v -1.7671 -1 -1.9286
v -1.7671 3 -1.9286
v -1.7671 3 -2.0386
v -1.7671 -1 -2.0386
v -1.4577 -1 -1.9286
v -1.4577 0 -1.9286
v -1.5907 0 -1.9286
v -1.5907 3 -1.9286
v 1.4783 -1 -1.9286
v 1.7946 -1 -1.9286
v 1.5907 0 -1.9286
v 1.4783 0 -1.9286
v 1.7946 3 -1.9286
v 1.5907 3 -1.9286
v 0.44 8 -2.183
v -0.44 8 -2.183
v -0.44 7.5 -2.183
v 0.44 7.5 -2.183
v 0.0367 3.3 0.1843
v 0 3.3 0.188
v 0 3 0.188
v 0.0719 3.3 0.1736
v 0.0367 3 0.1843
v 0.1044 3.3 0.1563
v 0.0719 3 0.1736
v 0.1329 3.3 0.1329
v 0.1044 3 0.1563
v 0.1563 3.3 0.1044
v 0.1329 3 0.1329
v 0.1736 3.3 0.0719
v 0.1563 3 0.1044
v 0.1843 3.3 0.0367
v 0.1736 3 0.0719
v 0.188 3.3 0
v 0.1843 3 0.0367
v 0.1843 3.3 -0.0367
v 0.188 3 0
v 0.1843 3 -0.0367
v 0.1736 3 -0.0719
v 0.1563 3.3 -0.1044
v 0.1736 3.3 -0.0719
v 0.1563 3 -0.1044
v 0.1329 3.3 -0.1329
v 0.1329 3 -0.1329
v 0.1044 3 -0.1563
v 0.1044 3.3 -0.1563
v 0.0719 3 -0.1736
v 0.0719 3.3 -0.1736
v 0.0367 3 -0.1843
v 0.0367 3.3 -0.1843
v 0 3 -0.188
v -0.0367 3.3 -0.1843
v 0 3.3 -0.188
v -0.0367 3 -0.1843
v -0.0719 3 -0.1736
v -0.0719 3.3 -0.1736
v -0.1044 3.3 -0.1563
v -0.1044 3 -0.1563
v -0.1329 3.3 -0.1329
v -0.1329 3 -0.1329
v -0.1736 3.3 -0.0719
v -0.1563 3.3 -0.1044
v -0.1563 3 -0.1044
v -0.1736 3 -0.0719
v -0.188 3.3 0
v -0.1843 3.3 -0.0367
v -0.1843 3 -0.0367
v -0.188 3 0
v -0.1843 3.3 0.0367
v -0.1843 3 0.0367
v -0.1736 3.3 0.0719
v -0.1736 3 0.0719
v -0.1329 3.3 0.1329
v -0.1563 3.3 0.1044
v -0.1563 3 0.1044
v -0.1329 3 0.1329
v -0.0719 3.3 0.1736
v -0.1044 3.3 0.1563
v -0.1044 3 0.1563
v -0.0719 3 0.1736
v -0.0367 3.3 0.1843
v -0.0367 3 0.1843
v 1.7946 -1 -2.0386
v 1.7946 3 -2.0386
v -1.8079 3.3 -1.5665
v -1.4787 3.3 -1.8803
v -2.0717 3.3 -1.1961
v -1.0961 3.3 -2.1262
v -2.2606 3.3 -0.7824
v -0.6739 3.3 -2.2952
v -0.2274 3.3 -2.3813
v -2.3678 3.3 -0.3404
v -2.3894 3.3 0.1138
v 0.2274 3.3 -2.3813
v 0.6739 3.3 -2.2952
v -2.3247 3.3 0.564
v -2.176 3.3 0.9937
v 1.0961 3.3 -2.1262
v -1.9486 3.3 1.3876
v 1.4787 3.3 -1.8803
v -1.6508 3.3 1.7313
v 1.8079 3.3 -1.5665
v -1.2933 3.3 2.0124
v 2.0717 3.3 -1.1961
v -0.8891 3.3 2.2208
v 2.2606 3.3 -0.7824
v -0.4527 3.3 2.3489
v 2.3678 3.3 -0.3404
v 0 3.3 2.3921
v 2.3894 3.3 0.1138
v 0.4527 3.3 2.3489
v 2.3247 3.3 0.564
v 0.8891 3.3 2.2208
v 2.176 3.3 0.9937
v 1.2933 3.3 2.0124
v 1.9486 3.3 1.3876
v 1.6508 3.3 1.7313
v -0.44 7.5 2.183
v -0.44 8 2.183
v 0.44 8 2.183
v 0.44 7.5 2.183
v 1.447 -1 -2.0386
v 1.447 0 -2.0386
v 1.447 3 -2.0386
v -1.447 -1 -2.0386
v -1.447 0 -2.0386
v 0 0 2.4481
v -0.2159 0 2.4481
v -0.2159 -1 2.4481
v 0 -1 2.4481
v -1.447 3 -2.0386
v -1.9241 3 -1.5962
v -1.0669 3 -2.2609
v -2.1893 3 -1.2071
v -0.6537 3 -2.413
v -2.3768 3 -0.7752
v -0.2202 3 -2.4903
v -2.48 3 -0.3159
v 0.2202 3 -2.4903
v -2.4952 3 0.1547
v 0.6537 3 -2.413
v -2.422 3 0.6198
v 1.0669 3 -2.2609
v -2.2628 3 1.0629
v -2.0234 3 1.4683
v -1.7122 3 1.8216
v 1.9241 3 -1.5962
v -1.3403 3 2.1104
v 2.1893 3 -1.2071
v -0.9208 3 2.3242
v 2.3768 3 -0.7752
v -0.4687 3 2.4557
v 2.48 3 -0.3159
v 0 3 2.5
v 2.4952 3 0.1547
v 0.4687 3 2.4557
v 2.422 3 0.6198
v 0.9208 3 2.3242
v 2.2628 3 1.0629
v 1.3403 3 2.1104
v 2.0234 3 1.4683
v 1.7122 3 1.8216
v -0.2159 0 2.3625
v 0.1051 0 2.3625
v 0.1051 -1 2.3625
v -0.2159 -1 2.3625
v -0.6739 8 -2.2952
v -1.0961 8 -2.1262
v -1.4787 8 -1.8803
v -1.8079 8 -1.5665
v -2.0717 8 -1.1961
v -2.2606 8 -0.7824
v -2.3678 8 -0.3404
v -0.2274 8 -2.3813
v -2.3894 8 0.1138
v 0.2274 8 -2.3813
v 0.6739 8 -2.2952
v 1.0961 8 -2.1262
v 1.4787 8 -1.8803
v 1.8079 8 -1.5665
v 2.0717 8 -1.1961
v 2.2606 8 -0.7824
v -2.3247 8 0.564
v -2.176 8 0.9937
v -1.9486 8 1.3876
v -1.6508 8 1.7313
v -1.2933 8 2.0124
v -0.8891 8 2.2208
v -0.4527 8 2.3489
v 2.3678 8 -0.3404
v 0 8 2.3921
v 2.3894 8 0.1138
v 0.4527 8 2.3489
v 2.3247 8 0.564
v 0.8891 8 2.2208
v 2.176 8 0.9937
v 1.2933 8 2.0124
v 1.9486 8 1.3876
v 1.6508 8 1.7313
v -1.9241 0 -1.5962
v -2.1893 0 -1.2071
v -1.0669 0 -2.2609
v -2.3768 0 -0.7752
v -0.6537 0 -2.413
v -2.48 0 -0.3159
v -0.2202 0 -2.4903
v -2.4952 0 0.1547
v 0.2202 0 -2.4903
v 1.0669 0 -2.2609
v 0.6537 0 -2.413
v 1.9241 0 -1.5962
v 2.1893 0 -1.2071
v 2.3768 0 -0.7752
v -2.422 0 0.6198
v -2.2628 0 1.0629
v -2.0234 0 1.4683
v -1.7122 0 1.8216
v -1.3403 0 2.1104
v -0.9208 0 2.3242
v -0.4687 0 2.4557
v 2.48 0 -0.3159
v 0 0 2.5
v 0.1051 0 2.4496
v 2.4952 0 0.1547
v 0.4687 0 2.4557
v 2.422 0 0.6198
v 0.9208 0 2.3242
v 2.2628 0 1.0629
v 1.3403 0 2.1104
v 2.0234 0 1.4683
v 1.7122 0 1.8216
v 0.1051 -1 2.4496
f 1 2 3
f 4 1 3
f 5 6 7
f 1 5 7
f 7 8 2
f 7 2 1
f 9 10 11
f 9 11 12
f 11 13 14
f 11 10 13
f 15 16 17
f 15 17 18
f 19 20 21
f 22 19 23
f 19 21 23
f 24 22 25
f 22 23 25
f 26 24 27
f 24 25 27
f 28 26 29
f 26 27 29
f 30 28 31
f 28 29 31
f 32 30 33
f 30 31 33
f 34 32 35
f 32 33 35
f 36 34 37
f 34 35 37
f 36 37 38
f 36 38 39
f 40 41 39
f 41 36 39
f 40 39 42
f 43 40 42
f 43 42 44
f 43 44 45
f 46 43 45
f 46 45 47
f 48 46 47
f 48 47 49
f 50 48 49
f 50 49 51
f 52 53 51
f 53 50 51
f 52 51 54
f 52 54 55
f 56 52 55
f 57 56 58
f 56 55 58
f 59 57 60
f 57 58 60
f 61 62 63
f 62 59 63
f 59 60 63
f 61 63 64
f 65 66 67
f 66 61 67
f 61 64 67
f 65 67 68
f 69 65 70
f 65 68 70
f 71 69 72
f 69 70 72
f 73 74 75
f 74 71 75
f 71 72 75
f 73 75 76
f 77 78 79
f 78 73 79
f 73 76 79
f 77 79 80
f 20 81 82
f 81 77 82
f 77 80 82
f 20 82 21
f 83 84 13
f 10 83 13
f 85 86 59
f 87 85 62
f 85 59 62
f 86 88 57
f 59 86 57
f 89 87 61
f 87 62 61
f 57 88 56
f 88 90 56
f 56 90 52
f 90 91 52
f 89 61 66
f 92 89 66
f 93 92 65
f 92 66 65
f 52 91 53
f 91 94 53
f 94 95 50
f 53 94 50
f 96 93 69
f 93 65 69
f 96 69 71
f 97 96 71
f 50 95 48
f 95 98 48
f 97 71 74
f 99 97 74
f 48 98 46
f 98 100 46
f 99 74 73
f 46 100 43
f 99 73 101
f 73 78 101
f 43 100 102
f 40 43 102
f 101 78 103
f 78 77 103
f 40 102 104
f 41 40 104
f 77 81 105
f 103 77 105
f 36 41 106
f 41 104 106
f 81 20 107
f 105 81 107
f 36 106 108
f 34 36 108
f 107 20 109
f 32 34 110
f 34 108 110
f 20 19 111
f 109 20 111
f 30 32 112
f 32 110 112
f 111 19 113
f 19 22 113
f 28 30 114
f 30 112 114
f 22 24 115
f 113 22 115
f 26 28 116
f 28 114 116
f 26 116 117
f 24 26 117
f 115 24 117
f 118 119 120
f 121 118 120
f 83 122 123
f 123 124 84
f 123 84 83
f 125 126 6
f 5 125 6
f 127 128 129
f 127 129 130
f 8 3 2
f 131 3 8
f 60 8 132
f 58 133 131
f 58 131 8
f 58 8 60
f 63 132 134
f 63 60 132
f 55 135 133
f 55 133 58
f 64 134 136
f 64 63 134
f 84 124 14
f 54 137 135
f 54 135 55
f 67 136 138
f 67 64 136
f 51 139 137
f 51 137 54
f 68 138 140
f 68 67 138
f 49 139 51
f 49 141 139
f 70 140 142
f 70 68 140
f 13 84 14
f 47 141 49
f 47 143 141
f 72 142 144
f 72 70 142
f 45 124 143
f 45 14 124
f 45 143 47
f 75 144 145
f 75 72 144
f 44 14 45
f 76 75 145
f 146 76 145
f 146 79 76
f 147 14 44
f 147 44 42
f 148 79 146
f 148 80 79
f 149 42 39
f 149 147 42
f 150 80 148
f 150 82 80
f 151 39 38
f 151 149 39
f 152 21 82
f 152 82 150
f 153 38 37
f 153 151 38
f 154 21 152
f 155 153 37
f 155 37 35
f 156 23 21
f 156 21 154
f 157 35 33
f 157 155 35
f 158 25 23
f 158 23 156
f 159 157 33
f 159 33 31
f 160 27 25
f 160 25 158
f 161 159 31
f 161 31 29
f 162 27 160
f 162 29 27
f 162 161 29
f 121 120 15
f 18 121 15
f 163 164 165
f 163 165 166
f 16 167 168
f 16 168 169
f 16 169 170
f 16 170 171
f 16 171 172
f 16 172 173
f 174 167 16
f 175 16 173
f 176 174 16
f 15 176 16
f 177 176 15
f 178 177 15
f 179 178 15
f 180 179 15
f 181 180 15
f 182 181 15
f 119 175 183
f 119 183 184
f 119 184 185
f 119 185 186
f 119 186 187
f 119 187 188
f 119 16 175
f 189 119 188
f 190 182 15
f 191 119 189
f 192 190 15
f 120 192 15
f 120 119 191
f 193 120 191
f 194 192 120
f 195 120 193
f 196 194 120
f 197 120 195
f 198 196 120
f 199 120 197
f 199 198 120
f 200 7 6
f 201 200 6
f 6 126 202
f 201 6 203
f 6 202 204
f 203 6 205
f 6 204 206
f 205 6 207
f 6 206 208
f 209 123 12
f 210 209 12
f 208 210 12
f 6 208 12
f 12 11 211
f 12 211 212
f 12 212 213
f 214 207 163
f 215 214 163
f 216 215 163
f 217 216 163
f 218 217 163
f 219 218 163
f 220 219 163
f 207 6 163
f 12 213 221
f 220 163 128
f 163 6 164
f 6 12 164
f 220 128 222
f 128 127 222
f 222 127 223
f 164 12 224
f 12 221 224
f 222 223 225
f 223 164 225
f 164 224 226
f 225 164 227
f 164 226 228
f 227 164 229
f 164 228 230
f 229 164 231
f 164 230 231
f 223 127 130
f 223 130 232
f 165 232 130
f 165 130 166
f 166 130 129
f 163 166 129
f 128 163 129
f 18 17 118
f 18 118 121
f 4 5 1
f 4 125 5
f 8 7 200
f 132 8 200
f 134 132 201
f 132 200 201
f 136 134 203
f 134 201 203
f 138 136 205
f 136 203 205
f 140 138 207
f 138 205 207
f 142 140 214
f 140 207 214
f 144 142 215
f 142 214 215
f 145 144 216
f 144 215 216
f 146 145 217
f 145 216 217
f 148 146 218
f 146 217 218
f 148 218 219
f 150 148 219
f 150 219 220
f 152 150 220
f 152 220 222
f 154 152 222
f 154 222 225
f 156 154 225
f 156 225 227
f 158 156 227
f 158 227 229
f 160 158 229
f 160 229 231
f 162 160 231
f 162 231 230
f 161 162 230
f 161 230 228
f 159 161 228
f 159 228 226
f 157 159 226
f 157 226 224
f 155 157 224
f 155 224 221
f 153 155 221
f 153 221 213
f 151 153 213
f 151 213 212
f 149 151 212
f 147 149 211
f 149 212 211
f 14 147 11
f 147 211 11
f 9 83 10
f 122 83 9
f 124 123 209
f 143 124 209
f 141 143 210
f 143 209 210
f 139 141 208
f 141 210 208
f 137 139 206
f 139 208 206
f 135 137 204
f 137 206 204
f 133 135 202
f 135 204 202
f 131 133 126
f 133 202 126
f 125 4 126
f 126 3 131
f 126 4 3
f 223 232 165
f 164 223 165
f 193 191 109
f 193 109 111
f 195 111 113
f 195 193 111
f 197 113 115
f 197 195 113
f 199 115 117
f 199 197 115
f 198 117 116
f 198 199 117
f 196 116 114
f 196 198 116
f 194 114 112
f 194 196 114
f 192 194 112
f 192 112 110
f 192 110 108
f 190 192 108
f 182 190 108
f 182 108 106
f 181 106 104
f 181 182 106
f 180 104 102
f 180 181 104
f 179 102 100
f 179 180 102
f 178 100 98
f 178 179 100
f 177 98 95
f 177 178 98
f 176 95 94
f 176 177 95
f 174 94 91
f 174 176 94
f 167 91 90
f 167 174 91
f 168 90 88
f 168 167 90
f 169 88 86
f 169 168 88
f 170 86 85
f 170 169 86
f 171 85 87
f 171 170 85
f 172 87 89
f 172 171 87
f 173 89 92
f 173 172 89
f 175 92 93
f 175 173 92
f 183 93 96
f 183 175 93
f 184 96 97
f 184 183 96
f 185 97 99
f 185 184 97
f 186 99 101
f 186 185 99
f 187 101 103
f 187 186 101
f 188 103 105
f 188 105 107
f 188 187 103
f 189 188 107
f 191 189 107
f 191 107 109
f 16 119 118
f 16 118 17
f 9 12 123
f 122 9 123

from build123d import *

# Parameters (mm, degrees)
SKETCH_1_R          = 2.5
EXTRUDE_1_DEPTH     = 3
SKETCH_2_R          = 0.187953655
EXTRUDE_2_DEPTH     = 7.3
CUT_EXTRUDE_START   = -2.3
SKETCH_4_R          = 0.187953655
CUT_EXTRUDE_1_DEPTH = 2.3
SKETCH_6_R          = 2.392138428
EXTRUDE_3_DEPTH     = 4.7
SKETCH_7_W          = 0.880091412
SKETCH_7_H          = 4.366078492
CUT_EXTRUDE_3_DEPTH = 0.5
EXTRUDE_4_DEPTH     = 1
EXTRUDE_5_DEPTH     = 4
SKETCH_11_W         = 0.290967458
SKETCH_11_H         = 0.085529097
CUT_EXTRUDE_4_DEPTH = 1


with BuildPart() as part:
    # 草图1 → 凸台-拉伸1 (new body)
    with BuildSketch(Plane(origin=(0, 0, 0), x_dir=(1, 0, 0), z_dir=(0, 1, 0))):
        with Locations(Location((0, 0, 0), (0, 0, 270))):
            Circle(SKETCH_1_R)
    extrude(amount=EXTRUDE_1_DEPTH)

    # 草图2 → 凸台-拉伸2 (add)
    with BuildSketch(Plane(origin=(0, 3, 0), x_dir=(1, 0, 0), z_dir=(0, 1, 0))):
        with Locations(Location((0, 0, 0), (0, 0, 270))):
            Circle(SKETCH_2_R)
    extrude(amount=EXTRUDE_2_DEPTH)

    # 草图4 → 切除-拉伸1 (cut)
    with BuildSketch(Plane(origin=(0, 10.3, 0), x_dir=(1, 0, 0), z_dir=(0, 1, 0)).offset(CUT_EXTRUDE_START)):
        with Locations(Location((0, 0, 0), (0, 0, 270))):
            Circle(SKETCH_4_R)
    extrude(amount=CUT_EXTRUDE_1_DEPTH, mode=Mode.SUBTRACT)

    # 草图6 → 凸台-拉伸3 (add)
    with BuildSketch(Plane(origin=(0, 8, 0), x_dir=(1, 0, 0), z_dir=(0, 1, 0))):
        with Locations(Location((0, 0, 0), (0, 0, 270))):
            Circle(SKETCH_6_R)
    extrude(amount=-EXTRUDE_3_DEPTH)

    # 草图7 → 切除-拉伸3 (cut)
    with BuildSketch(Plane(origin=(0, 8, 0), x_dir=(1, 0, 0), z_dir=(0, 1, 0))):
        Rectangle(SKETCH_7_W, SKETCH_7_H)
    extrude(amount=-CUT_EXTRUDE_3_DEPTH, mode=Mode.SUBTRACT)

    # 草图9 → 凸台-拉伸4 (add)
    with BuildSketch(Plane.XZ):
        Polygon((0, 2.448076853), (0.473512734, 2.454747582), (0.473512734, 2.362547756), (-0.506872491, 2.362547756), (-0.506872491, 2.448076853), align=None)
    extrude(amount=EXTRUDE_4_DEPTH)

    # 草图10 → 凸台-拉伸5 (add)
    with BuildSketch(Plane(origin=(0, 3, 0), x_dir=(1, 0, 0), z_dir=(0, 1, 0))):
        Polygon((-1.457651402, 1.928637822), (-1.767058539, 1.928637822), (-1.767058539, 2.038649249), (-1.447034637, 2.038649249), align=None)
        Polygon((1.478278545, 1.928637822), (1.447034637, 2.038649249), (1.794561396, 2.038649249), (1.794561396, 1.928637822), align=None)
    extrude(amount=-EXTRUDE_5_DEPTH)

    # 草图11 → 切除-拉伸4 (cut)
    with BuildSketch(Plane.XZ.offset(1)):
        with Locations((-0.361388762, 2.405312305)):
            Rectangle(SKETCH_11_W, SKETCH_11_H)
        Polygon((0.105106814, 2.449557571), (0.105106814, 2.362547756), (0.473512734, 2.362547756), (0.473512734, 2.454747582), align=None)
    extrude(amount=-CUT_EXTRUDE_4_DEPTH, mode=Mode.SUBTRACT)


solid = part.part
